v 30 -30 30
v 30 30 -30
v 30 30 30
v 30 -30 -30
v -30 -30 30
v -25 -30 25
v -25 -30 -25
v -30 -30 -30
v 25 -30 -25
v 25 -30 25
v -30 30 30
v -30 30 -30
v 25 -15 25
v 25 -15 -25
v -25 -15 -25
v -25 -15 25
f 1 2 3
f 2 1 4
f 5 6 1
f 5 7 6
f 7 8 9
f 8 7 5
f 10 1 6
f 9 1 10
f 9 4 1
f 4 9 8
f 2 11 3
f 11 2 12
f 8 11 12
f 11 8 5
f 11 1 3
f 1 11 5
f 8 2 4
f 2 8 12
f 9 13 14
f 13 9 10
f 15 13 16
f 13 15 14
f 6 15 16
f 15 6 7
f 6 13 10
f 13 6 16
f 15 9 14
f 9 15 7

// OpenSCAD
// rotate([90,0,0]) results in a matrix with some close-to-zero values
// Transforming an empty boundingbox by this matrix has caused a problem resulting
// in the union being evaluated to nothing.
rotate([90,0,0])
difference() {
  cube(60, center=true);
  union() {
    translate([0,0,40]) cube(50, center=true);
    cube(0);
  }
}
